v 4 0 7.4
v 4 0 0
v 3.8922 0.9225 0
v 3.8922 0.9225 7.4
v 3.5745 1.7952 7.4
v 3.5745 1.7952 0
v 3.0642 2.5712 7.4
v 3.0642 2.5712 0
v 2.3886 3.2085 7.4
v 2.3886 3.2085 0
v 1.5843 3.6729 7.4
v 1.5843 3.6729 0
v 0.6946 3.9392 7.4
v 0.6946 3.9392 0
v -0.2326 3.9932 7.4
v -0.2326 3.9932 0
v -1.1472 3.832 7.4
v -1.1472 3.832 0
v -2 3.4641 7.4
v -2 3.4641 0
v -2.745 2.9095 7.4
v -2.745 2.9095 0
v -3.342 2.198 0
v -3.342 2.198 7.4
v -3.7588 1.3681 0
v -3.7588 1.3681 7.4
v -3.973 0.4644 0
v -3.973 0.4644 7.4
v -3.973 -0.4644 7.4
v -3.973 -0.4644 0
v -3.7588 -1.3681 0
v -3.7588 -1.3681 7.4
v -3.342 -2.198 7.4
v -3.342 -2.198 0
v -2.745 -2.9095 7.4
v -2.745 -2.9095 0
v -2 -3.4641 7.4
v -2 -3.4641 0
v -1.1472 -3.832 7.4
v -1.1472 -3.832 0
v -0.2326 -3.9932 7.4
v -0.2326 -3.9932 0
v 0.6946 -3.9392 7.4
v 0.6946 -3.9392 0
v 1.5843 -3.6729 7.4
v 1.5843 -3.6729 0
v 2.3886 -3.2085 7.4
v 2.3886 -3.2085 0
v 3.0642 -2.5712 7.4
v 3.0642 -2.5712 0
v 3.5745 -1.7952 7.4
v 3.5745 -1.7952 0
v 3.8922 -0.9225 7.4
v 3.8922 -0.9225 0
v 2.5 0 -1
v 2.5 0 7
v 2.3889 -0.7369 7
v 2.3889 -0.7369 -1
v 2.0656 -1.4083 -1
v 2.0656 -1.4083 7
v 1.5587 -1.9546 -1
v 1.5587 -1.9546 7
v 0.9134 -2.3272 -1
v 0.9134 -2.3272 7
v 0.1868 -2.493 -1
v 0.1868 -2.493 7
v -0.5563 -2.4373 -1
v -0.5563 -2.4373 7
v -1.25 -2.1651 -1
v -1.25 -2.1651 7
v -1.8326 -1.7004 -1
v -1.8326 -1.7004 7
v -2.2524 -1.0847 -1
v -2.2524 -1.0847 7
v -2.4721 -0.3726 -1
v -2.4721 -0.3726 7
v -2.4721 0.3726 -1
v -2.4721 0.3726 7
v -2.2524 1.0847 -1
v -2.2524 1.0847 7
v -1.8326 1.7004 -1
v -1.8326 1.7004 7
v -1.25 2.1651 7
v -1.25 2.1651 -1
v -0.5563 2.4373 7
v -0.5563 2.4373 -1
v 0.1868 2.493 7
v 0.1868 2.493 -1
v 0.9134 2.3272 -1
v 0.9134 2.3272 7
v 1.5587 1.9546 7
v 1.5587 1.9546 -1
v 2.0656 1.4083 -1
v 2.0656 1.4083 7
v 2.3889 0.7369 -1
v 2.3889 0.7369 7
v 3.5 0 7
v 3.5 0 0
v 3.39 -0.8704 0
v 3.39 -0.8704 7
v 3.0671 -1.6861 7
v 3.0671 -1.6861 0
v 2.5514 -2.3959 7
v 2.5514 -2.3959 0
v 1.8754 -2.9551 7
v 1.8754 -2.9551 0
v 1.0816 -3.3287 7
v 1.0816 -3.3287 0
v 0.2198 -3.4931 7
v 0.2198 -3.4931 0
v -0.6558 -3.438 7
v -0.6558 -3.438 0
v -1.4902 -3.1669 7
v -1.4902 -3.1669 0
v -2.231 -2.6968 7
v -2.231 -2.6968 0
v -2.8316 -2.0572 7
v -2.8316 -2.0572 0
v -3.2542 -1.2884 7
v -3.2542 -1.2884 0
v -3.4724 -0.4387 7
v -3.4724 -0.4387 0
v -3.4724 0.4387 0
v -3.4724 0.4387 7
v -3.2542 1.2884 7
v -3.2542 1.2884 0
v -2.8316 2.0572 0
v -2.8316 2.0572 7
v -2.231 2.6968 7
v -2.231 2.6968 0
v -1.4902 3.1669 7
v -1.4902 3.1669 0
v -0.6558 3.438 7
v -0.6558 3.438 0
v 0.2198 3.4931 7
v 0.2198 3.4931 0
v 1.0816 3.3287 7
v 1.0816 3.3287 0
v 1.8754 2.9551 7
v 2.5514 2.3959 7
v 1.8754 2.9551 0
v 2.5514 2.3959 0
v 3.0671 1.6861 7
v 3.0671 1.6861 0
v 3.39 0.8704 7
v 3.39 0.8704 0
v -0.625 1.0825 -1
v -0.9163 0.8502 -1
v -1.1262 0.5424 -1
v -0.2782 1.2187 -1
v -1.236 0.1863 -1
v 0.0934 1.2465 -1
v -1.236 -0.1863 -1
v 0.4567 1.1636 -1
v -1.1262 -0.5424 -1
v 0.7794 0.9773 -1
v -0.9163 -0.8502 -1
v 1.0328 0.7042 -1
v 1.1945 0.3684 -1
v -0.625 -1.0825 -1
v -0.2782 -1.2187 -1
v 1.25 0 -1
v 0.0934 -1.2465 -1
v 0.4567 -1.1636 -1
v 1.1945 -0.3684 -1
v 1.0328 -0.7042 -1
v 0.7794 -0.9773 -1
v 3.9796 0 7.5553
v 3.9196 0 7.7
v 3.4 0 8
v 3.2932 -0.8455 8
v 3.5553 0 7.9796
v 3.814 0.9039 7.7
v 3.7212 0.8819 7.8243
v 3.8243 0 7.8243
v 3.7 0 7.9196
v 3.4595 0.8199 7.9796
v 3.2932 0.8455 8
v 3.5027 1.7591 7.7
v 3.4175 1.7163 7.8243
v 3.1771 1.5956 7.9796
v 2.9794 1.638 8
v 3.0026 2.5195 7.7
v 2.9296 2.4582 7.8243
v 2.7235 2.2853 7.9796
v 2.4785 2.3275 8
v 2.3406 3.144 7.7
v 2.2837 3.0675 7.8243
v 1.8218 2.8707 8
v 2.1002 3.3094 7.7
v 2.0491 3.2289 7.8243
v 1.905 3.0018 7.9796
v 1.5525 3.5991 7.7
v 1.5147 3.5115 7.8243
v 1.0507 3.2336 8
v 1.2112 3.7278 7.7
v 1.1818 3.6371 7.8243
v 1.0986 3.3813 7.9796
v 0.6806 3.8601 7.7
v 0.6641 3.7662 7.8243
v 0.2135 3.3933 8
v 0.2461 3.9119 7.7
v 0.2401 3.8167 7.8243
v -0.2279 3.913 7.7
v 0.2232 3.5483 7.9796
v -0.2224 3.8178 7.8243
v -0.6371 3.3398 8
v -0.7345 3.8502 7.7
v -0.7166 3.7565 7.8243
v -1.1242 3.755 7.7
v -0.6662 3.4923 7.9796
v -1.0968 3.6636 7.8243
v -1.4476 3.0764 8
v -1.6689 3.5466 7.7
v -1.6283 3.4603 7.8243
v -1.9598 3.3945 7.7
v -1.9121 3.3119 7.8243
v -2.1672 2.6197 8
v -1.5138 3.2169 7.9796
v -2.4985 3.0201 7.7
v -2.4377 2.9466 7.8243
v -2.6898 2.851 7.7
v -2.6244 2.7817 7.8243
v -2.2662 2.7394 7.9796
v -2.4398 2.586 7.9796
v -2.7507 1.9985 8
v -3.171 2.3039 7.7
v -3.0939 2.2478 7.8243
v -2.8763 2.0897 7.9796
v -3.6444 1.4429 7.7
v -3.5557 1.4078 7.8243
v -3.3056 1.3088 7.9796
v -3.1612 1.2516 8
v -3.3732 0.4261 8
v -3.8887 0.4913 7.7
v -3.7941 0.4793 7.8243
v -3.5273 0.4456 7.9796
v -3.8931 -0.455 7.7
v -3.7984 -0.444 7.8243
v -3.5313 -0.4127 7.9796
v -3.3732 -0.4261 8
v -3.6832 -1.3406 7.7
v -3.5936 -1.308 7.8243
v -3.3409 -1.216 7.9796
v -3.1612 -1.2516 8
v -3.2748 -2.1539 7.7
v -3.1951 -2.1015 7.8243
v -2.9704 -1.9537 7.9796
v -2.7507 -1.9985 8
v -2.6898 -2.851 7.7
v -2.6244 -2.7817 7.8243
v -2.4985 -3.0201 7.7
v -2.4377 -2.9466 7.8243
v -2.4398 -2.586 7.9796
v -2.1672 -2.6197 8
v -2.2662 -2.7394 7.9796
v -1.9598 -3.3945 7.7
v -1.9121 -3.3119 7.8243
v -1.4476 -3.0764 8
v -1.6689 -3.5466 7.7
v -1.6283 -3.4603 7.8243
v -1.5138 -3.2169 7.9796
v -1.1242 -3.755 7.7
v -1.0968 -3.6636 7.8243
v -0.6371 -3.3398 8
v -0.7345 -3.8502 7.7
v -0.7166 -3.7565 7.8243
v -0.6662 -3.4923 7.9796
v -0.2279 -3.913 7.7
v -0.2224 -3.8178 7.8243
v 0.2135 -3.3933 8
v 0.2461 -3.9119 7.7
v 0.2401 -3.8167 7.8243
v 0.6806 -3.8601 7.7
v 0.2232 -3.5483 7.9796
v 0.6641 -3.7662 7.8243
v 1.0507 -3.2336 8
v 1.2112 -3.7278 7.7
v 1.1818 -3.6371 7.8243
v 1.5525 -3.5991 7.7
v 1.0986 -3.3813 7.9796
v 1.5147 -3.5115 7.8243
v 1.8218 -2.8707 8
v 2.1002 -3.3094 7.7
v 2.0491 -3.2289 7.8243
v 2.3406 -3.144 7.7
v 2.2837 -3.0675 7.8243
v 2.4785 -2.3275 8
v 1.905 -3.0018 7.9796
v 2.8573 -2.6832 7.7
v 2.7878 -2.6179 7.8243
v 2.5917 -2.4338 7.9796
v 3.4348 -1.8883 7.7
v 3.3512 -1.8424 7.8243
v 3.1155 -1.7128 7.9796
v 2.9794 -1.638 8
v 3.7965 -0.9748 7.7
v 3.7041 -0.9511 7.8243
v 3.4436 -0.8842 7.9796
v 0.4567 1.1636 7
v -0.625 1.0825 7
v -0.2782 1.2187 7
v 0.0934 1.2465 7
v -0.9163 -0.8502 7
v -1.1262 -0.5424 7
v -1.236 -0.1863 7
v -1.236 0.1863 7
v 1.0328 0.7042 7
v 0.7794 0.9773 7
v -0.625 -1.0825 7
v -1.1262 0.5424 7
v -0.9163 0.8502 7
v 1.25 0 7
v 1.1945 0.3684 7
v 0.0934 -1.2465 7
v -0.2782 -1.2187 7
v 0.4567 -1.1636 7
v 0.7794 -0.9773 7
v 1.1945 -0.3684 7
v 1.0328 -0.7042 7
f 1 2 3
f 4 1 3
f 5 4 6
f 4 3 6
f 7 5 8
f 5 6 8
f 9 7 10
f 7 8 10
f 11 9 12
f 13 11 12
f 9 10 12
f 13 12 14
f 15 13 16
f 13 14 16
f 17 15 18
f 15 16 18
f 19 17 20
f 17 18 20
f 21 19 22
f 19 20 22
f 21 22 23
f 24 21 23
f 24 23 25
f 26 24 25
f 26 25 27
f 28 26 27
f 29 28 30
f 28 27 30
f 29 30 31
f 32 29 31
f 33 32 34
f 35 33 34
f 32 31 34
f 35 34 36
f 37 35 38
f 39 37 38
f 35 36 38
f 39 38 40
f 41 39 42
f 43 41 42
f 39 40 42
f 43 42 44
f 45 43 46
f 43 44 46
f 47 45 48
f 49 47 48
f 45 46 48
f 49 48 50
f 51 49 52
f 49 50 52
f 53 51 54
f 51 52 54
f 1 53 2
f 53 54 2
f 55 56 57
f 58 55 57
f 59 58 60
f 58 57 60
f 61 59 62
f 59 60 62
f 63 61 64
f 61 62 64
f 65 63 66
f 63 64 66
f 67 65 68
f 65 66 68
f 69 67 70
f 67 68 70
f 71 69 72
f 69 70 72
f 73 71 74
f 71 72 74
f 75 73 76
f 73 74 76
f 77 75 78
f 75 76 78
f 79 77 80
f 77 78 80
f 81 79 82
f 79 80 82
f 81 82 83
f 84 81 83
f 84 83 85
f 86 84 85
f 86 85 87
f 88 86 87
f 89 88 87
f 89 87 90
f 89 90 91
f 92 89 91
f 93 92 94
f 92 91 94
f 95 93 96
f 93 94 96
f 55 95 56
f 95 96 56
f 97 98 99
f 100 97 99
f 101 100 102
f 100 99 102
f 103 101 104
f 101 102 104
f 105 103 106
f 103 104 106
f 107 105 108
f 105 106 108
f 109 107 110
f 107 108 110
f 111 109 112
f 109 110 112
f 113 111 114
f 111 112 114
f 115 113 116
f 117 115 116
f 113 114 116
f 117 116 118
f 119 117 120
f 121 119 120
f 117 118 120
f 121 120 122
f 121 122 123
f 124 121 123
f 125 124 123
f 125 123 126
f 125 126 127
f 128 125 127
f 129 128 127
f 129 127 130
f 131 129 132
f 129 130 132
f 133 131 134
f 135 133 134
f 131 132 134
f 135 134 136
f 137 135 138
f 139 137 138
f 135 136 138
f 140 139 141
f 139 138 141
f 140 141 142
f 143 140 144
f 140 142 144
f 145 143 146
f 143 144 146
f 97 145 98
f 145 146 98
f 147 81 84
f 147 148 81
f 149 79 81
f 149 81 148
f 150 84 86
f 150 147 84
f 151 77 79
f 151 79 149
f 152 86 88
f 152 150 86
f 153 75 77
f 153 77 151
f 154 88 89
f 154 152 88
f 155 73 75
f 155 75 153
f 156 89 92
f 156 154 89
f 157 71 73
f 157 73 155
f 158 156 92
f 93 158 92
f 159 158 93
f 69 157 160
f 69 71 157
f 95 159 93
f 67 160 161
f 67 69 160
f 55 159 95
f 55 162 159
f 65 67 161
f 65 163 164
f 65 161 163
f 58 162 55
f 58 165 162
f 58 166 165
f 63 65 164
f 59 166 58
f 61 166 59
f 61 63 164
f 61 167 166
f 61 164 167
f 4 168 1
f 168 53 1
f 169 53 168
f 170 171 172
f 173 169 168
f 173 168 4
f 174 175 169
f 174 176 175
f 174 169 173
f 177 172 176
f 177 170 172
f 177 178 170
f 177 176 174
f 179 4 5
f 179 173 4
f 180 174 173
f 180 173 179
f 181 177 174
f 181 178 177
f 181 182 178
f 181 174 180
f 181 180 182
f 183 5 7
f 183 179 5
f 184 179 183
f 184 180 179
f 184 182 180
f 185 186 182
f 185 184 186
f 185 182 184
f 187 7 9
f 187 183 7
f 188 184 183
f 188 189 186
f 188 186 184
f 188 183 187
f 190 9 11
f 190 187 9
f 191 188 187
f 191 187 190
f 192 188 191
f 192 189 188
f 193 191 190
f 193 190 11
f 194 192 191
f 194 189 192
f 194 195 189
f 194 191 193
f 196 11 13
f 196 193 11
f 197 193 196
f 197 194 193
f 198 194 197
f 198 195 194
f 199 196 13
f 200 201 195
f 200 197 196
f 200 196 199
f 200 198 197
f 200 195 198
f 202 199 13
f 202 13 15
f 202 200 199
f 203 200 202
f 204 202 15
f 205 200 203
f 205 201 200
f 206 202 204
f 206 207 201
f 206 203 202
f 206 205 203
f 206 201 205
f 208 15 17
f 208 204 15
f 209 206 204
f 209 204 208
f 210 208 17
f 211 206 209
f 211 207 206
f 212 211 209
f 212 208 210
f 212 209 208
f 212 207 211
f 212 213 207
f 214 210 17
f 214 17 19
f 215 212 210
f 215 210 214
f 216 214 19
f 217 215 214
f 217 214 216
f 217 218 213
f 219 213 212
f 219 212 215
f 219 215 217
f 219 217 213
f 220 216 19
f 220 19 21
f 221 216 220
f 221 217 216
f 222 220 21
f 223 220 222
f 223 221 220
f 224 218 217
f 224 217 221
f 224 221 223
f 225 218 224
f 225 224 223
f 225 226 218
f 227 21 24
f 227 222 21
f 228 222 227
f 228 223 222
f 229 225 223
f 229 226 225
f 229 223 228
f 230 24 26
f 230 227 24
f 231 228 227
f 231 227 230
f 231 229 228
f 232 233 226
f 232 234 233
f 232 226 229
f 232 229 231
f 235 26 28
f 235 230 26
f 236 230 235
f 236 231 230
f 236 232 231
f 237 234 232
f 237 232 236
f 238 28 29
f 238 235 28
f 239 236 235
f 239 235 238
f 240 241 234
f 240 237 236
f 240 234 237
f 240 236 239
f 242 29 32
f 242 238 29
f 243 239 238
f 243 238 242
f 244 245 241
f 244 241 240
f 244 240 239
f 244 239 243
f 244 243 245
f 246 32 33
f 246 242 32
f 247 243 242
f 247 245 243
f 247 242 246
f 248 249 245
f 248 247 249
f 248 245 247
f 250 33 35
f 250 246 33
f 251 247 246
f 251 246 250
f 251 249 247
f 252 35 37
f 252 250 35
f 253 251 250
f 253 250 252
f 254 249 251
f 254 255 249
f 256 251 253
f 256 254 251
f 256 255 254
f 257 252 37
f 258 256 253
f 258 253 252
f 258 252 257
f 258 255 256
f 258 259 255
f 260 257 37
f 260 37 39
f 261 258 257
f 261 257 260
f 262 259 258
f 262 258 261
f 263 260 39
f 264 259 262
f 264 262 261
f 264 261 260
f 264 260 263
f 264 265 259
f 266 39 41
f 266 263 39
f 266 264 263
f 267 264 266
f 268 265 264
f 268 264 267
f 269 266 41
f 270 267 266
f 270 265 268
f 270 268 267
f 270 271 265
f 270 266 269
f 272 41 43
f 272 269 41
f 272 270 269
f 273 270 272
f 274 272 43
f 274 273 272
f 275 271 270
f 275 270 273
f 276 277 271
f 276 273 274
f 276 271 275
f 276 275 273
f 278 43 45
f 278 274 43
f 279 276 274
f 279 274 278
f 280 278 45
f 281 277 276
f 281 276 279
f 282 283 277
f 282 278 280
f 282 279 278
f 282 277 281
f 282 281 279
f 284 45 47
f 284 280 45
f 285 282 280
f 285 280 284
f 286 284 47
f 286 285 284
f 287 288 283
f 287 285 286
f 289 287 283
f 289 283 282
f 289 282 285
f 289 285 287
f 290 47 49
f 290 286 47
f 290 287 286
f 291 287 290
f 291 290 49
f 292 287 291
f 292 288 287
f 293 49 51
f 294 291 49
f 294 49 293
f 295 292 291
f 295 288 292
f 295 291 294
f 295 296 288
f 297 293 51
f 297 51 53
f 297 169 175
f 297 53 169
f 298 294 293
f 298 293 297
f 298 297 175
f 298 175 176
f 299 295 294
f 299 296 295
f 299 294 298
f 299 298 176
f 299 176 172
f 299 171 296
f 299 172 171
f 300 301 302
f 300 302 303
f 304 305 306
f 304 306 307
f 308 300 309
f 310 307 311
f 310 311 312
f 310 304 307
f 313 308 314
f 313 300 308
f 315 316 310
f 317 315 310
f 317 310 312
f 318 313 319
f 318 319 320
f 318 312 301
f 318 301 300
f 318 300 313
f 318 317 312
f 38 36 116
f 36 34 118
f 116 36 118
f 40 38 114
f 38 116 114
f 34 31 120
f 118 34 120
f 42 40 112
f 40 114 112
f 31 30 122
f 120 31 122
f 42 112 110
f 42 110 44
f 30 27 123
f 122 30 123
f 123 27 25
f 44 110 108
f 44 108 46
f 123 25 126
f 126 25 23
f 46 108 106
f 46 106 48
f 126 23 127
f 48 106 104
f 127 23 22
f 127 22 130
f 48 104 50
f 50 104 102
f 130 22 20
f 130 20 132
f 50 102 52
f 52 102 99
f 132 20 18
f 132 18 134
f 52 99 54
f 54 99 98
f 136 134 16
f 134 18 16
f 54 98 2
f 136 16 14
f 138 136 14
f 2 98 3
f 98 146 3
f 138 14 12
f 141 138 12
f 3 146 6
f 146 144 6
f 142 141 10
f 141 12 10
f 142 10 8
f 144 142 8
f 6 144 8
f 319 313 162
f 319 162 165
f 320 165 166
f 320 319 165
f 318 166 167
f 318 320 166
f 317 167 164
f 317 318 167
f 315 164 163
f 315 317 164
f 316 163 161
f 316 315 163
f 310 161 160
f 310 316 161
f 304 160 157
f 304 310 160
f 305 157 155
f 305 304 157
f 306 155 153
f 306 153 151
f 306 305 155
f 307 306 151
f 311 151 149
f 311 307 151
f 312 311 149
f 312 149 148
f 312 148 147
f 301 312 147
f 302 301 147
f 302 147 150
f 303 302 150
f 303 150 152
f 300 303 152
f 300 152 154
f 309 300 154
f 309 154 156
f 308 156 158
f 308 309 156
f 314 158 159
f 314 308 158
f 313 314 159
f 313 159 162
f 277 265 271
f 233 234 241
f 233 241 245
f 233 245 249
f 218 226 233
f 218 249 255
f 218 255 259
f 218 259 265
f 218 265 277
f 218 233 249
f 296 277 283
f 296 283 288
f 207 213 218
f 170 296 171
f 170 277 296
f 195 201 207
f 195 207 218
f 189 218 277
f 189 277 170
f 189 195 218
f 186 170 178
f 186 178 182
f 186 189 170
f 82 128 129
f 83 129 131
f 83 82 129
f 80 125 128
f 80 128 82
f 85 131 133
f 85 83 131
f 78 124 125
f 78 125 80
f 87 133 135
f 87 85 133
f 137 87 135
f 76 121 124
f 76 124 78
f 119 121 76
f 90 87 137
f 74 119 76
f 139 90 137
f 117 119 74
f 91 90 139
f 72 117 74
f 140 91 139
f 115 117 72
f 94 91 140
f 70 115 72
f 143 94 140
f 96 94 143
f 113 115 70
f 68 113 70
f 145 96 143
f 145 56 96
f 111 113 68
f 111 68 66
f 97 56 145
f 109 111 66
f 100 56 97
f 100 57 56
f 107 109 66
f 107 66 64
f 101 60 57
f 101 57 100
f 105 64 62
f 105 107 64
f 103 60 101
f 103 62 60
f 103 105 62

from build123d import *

# Parameters (mm, degrees)
F0_R     = 4
F1_DEPTH = 8
F2_R     = 0.6
F3_R     = 3.5
F4_DEPTH = 7
F5_R     = 2.5
F5_R_2   = 1.25
F6_DEPTH = 8


with BuildPart() as f1:
    # F0 (on Top) → F1 (new body)
    with BuildSketch(Plane.XY):
        Circle(F0_R)
    extrude(amount=F1_DEPTH)

    # F2
    f2_edges = [f1.edges().sort_by_distance(p)[0] for p in [
        (-4, 0, 8),
    ]]
    fillet(f2_edges, radius=F2_R)

    # F3 (on face) → F4 (cut)
    with BuildSketch(Plane(origin=(0, 0, 0), x_dir=(1, 0, 0), z_dir=(0, 0, -1))):
        Circle(F3_R)
    extrude(amount=-F4_DEPTH, mode=Mode.SUBTRACT)

    # F5 (on face) → F6 (join)
    with BuildSketch(Plane(origin=(0, 0, 7), x_dir=(1, 0, 0), z_dir=(0, 0, -1))):
        Circle(F5_R)
        Circle(F5_R_2, mode=Mode.SUBTRACT)
    extrude(amount=F6_DEPTH)


solid = f1.part
